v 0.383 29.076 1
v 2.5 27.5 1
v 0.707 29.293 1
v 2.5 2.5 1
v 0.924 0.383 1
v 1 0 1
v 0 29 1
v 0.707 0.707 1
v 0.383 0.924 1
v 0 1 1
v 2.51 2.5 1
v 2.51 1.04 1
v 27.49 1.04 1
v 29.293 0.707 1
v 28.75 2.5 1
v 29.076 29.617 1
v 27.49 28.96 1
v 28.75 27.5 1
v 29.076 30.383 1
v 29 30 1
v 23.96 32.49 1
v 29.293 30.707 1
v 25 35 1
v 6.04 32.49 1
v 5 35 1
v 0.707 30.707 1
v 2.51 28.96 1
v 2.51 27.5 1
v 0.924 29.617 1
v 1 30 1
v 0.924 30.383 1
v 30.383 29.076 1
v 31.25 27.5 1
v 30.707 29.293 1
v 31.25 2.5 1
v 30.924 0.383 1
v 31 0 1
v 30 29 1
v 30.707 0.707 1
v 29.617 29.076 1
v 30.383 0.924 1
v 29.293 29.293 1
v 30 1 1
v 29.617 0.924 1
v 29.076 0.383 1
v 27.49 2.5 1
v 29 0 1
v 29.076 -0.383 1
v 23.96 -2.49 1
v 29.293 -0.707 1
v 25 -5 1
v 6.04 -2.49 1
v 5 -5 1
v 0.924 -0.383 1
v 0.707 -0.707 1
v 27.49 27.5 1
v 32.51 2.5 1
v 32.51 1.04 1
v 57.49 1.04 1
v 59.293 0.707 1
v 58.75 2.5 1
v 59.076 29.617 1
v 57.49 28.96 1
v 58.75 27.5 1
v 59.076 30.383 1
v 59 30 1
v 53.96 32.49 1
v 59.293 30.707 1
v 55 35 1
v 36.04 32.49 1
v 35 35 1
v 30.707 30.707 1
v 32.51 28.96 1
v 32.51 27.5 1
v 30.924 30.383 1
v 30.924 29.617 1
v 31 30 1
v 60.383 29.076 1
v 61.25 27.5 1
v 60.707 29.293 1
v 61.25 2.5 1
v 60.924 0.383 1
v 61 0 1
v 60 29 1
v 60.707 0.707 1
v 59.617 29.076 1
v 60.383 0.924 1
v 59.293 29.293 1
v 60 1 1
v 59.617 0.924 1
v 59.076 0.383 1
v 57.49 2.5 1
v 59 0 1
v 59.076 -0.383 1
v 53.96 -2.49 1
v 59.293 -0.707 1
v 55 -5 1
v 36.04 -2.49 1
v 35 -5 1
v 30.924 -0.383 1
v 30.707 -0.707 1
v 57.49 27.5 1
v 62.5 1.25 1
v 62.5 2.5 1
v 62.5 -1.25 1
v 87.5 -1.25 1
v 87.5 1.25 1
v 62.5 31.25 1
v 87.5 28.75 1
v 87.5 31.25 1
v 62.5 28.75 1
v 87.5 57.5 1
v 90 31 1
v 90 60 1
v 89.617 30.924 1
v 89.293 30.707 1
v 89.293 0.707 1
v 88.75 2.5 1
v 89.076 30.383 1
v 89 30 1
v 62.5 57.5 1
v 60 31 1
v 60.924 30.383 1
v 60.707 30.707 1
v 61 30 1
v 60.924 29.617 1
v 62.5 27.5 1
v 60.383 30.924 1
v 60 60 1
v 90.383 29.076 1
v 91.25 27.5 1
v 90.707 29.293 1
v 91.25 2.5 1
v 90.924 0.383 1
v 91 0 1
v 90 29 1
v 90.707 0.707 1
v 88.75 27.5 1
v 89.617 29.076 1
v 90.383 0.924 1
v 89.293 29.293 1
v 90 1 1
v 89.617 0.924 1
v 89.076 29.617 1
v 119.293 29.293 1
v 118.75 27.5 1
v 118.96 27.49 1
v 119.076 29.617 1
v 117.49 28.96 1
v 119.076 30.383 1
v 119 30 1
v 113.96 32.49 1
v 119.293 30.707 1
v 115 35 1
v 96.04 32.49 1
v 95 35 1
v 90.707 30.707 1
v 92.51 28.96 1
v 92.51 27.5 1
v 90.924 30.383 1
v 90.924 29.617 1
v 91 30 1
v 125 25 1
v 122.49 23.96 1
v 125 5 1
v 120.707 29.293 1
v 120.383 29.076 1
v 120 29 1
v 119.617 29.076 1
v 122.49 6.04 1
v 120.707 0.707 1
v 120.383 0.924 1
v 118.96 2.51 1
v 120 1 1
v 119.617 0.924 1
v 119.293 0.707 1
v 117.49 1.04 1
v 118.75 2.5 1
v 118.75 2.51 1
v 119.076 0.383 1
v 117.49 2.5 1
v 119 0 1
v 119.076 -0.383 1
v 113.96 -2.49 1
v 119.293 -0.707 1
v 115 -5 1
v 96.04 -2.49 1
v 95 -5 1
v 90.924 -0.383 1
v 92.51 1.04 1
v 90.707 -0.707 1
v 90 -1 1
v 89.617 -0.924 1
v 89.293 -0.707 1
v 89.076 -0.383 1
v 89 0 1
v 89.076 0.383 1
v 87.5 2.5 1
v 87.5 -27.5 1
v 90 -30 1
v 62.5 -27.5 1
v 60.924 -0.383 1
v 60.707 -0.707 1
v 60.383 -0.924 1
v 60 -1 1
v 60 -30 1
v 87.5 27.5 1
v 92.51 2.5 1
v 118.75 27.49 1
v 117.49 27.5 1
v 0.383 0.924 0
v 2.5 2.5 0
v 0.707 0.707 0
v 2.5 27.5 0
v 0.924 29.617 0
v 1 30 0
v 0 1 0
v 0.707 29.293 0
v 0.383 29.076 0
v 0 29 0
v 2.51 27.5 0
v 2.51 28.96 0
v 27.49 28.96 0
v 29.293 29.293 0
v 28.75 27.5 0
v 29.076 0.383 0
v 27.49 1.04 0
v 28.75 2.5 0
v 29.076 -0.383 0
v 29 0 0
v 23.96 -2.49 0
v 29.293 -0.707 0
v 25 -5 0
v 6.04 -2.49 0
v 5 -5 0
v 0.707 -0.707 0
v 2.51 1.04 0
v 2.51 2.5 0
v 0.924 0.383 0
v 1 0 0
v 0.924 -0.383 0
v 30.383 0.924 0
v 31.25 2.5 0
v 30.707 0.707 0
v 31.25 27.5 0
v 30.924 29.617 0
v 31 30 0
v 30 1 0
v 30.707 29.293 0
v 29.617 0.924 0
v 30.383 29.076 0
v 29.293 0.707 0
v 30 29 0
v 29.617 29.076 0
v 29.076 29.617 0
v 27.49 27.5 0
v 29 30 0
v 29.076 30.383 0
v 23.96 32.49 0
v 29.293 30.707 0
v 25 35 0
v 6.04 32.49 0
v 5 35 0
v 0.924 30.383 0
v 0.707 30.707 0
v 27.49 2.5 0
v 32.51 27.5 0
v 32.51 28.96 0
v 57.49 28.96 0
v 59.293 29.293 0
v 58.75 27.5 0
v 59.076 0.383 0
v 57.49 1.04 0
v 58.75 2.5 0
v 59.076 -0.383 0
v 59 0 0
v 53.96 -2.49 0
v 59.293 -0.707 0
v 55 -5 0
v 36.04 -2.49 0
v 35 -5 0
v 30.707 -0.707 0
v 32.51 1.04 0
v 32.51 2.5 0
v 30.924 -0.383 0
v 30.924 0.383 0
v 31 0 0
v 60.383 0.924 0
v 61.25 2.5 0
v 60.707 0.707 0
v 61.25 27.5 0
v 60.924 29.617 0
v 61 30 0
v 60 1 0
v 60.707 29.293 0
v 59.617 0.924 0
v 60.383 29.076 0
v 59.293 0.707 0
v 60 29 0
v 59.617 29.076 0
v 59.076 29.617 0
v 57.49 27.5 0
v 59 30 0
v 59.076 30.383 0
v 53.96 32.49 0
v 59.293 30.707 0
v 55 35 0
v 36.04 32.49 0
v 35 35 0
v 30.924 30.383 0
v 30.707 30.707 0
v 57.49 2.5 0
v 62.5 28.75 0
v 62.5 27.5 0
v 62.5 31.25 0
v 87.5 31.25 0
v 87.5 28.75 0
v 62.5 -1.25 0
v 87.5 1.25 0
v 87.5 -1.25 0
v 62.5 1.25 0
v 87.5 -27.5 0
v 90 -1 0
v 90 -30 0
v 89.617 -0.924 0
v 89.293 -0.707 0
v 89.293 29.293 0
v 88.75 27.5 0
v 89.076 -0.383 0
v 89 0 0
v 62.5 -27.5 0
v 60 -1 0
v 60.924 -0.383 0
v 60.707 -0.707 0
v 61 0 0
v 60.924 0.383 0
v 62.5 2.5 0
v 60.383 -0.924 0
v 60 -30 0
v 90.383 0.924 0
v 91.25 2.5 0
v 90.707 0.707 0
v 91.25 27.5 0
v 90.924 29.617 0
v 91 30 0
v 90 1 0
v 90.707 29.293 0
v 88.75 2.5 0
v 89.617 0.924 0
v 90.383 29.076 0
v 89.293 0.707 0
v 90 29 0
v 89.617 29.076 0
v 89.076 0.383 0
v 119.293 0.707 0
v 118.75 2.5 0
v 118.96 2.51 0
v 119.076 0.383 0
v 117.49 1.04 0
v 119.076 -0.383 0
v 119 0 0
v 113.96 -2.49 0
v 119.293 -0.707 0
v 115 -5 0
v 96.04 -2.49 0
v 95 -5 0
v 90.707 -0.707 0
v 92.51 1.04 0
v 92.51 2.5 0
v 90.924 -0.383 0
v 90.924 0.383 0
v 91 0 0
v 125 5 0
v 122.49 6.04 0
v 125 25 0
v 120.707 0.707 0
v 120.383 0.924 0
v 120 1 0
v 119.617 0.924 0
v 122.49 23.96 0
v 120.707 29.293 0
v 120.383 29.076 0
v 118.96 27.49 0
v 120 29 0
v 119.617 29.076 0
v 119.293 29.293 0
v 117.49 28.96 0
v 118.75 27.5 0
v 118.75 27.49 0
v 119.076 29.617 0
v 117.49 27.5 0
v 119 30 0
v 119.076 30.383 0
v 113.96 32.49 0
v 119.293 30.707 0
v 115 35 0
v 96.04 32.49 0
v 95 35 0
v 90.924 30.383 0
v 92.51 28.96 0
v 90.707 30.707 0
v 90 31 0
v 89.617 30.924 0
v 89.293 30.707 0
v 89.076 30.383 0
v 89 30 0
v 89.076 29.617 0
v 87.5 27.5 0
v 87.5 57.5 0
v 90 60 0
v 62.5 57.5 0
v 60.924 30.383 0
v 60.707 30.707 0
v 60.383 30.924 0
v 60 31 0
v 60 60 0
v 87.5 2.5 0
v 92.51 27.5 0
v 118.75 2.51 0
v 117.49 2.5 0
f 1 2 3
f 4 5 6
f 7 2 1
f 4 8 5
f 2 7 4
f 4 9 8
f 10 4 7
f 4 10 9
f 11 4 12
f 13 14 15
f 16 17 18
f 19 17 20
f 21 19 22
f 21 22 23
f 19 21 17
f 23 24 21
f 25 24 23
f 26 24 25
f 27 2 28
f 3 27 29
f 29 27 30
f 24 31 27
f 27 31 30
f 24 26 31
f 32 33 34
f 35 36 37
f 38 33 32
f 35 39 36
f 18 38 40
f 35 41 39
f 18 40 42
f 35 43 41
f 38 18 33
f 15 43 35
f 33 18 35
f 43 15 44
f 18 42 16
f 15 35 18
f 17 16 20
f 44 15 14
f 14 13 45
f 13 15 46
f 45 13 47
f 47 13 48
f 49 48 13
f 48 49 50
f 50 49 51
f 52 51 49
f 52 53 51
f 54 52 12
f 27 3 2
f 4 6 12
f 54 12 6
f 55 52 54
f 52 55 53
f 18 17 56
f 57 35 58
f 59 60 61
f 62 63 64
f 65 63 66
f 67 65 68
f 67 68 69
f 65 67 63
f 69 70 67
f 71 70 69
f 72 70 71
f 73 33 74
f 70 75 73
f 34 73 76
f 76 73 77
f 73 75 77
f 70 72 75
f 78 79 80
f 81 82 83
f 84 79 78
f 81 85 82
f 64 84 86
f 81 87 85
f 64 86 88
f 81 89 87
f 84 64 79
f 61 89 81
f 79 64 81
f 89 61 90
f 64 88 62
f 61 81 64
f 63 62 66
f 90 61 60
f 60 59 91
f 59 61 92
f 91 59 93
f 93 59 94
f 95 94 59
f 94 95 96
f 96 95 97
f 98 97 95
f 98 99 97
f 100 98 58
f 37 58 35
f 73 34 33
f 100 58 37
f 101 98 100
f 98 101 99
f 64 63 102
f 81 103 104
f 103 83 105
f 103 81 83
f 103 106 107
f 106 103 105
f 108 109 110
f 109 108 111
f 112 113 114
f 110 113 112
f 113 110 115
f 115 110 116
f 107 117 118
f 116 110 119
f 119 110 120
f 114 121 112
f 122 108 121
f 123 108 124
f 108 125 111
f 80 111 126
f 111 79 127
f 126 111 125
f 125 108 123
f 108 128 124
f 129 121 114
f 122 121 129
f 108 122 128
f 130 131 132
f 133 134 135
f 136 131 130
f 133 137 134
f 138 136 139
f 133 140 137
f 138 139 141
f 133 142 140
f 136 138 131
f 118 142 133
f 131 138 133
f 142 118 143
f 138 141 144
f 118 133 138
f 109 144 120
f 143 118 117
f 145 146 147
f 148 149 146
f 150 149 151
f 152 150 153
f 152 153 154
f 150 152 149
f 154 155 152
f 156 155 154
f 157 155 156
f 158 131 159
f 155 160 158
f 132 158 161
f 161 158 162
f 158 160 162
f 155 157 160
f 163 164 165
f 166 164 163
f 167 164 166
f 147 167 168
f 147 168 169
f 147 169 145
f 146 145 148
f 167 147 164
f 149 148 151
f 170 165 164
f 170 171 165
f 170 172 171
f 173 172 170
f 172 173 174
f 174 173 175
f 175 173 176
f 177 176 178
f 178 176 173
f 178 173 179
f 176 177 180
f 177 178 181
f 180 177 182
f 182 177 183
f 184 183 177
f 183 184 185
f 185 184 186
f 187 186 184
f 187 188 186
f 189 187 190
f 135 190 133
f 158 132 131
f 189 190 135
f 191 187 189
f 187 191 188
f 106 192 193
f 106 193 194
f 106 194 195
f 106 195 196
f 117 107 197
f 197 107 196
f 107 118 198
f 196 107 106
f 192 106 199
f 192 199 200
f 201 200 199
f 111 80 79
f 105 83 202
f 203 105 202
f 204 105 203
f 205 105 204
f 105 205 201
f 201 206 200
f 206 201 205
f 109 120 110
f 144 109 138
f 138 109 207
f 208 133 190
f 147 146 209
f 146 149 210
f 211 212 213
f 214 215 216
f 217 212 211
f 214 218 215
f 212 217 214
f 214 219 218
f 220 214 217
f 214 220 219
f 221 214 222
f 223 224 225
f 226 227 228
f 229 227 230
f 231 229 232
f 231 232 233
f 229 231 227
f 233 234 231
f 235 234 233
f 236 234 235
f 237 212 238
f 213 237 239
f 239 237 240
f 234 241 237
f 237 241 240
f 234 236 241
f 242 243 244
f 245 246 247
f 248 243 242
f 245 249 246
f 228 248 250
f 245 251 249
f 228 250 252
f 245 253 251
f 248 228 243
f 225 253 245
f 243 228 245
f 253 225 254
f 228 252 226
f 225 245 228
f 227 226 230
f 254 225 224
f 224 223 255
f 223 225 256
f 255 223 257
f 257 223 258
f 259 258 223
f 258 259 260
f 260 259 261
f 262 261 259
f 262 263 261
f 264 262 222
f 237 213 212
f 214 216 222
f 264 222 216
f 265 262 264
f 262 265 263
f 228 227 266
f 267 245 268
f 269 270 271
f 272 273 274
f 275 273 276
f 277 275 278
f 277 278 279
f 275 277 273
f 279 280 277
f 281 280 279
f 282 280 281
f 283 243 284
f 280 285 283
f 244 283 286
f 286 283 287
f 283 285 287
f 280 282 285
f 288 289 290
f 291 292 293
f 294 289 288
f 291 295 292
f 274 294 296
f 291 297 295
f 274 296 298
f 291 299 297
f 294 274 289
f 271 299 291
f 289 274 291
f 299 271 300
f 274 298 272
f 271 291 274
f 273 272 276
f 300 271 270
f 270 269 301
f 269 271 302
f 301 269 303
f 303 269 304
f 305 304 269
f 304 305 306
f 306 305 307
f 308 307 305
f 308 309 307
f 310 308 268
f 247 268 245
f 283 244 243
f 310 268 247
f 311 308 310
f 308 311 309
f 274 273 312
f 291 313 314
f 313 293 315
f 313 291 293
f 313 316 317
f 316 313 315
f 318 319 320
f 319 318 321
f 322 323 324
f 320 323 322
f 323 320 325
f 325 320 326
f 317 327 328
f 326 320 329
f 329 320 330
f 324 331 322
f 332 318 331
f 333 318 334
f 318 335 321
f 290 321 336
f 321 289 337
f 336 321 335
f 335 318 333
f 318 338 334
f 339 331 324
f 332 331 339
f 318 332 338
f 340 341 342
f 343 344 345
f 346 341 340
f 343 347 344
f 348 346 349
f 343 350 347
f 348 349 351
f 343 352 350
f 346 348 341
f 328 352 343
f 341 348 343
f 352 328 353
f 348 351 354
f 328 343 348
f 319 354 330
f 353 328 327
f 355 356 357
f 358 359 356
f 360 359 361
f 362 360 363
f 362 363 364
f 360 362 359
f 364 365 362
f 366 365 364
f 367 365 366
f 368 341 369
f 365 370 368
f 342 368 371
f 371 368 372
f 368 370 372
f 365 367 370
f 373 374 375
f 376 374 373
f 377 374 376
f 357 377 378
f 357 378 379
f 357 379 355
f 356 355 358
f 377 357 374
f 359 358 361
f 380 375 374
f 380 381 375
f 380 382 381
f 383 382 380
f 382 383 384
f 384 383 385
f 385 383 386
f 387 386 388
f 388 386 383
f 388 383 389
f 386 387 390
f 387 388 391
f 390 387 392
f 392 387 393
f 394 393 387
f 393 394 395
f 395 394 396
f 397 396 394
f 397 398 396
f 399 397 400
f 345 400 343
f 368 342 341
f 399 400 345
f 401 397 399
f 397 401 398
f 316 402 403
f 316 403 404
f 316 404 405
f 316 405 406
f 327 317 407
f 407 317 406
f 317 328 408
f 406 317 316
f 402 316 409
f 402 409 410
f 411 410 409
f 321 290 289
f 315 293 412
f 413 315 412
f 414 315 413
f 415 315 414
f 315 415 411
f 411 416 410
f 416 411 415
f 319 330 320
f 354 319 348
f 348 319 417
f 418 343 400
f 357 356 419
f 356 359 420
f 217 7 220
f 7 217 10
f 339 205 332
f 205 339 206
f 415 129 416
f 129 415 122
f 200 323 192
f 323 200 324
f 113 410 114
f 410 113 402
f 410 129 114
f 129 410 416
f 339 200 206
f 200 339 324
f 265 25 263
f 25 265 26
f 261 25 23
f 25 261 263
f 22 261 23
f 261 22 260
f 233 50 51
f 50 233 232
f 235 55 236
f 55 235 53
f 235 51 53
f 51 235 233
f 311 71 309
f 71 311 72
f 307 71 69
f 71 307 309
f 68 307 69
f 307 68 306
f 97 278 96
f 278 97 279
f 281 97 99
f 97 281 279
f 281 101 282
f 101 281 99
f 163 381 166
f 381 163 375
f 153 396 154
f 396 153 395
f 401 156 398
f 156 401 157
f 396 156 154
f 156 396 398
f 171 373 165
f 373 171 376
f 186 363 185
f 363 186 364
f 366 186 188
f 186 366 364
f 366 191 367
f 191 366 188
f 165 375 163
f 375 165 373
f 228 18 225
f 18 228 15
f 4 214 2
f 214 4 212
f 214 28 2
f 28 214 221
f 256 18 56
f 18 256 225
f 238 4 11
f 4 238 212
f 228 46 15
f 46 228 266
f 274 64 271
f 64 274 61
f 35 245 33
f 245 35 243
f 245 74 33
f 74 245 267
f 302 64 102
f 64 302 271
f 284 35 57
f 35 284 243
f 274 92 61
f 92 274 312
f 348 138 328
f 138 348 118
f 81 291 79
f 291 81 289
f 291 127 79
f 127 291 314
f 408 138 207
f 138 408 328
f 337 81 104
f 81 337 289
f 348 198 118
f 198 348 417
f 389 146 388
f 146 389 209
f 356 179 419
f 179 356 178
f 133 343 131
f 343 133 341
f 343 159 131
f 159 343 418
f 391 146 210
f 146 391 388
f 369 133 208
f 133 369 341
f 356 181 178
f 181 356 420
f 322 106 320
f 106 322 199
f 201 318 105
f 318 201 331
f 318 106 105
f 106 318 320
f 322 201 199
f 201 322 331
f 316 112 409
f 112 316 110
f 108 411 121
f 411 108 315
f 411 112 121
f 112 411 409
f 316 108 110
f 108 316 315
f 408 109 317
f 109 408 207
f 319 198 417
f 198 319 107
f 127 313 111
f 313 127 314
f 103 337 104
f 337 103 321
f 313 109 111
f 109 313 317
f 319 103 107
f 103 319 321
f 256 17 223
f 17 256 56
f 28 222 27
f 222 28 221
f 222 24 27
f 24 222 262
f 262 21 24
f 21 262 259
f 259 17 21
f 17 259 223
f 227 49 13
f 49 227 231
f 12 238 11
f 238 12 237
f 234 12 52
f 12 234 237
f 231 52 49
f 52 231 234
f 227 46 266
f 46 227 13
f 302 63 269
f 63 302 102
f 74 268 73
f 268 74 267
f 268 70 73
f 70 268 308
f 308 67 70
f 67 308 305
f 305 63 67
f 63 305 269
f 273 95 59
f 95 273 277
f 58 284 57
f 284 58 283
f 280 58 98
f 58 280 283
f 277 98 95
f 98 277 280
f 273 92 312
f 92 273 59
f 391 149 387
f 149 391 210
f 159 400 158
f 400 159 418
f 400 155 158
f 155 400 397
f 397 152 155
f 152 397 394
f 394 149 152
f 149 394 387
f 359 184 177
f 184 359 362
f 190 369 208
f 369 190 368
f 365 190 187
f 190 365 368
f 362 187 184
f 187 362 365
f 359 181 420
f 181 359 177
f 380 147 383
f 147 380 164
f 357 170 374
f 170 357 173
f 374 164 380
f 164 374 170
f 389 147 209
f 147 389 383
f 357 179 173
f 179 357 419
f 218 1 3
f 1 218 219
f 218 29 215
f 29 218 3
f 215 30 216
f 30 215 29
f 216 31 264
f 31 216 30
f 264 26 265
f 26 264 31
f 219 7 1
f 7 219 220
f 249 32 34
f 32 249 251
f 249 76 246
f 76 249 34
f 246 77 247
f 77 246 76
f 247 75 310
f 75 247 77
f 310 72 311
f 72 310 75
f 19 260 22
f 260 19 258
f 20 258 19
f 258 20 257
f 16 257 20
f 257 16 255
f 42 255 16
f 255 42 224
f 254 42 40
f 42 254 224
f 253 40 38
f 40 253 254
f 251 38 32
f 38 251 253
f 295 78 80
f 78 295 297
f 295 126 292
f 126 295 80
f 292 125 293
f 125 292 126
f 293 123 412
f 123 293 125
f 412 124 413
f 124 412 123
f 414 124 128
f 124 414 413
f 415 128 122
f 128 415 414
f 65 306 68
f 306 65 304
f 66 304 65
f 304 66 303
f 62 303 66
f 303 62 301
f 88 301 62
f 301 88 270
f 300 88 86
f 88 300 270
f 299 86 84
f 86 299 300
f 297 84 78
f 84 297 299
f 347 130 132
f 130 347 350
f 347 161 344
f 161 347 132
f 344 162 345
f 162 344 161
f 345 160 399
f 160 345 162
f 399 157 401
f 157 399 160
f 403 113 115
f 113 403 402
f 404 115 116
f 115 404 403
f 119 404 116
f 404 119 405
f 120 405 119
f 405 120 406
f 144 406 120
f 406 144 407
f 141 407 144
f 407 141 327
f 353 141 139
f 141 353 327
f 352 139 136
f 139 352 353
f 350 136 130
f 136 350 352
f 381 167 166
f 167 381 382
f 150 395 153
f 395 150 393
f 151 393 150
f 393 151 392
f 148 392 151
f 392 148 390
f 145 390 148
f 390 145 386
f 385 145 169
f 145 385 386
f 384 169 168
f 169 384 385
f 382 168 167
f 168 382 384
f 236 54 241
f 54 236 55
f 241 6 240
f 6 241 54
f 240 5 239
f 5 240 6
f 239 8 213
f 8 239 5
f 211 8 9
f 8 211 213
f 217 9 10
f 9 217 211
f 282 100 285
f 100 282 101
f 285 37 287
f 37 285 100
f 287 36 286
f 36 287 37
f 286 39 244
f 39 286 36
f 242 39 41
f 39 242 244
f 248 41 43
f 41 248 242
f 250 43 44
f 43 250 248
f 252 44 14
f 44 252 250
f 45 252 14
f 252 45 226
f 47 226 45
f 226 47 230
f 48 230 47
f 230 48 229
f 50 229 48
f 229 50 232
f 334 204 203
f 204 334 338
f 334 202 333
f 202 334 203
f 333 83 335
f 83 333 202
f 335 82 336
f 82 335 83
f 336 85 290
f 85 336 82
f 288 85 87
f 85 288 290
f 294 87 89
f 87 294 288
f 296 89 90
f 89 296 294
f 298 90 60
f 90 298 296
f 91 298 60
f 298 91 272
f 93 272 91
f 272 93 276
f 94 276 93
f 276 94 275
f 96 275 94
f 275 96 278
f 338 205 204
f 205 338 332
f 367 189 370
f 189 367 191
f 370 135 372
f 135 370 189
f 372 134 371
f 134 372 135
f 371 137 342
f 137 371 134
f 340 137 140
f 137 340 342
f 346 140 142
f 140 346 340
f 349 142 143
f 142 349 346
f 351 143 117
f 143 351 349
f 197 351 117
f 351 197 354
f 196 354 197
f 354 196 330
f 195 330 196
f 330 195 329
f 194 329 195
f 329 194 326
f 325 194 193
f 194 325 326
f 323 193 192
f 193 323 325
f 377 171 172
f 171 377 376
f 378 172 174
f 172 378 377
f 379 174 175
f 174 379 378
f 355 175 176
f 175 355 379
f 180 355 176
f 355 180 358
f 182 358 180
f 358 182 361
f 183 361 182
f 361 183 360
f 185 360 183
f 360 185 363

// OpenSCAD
width  = 30;

height = 30;

depth  = 30;

/* [Template settings] */

thickness     = 1;

// Size of pads, small values will you hard time folding them
pad_size      = 5;

// You better keep it empty to save filament
empty         = 1; //[1:yes, 0:no]

/* [Advanced] */

// Width of the beams, ignored if template is filled
beam_width    = 2.5;

// Radius of the notches to mark folding points, modify if your pen does not fit
notch_radius  = 1;

// Whether to enable support. Disabling support will save filament but your template will not be durable.
support       = 1; //[1:yes, 0:no]

/* [Hidden] */

module UnfoldedBox(width, height, depth, thickness) {
    cube([width, depth, thickness]);

    translate([width, 0])
        cube([height, depth, thickness]);
        
    translate([width+height, 0])
        cube([width, depth, thickness]);

    translate([width*2+height, 0])
        cube([height, depth, thickness]);

    translate([width+height, depth])
        cube([width, height, thickness]);
        
    translate([width+height, -height])
        cube([width, height, thickness]);
}

module UnfoldedBoxPads(width, height, depth, thickness, pad_size, beam_width=0) {
    translation = [0, width, width*2+height];
    widths      = [width, height, height];
    
    bwe=beam_width*sqrt(2)-beam_width;
    bw=beam_width;
    
    for(i = [0:2]) {
        t=translation[i];
        w=widths[i];
        linear_extrude(thickness)
        translate([t, depth])
            polygon([
                [bw             ,-bw         ],
                [bw             ,-bwe        ],
                [pad_size+bwe   , pad_size-bw],
                [w-pad_size-bwe , pad_size-bw],
                [w-bw           ,-bwe        ],
                [w-bw           ,-bw         ],
            ]);
            
        linear_extrude(thickness)
        translate([t, 0])
        mirror([0, 1])
            polygon([
                [bw             ,-bw         ],
                [bw             ,-bwe        ],
                [pad_size+bwe   , pad_size-bw],
                [w-pad_size-bwe , pad_size-bw],
                [w-bw           ,-bwe        ],
                [w-bw           ,-bw         ]
            ]);
    }
    
    linear_extrude(thickness)
    translate([width*2+height*2, 0])
        polygon([
            [-bw         , bw                ],
            [-bwe        , bw                ],
            [ pad_size-bw, pad_size+bwe      ],
            [ pad_size-bw, depth-pad_size-bwe],
            [-bwe        , depth-bw          ],
            [-bw         , depth-bw          ]
        ]);
}

difference() {
    union() {
        UnfoldedBox(width, height, depth, thickness);
        UnfoldedBoxPads(width, height, depth, thickness, pad_size);
    }
    
    if(empty) {
        if(support) {        
            translate([beam_width, beam_width, -0.005])
                cube([width-beam_width*1.5, depth-beam_width*2, thickness+0.01]);
            
            translate([width+beam_width*.5, beam_width, -0.005])
                cube([height-beam_width, depth-beam_width*2, thickness+0.01]);
            
            translate([width+height+beam_width*.5, beam_width, -0.005])
                cube([width-beam_width, depth-beam_width*2, thickness+0.01]);
            
            translate([width*2+height+beam_width*.5, beam_width, -0.005])
                cube([height-beam_width, depth-beam_width*2, thickness+0.01]);
            
            translate([beam_width+width+height, beam_width-height, -0.005])
                cube([width-beam_width*2, height-beam_width*1.5, thickness+0.01]);
            
            translate([beam_width+width+height, beam_width*.5+depth, -0.005])
                cube([width-beam_width*2, height-beam_width*1.5, thickness+0.01]);
                            
            translate([beam_width+width+height, beam_width*.5, -0.005])
                cube([width-beam_width*2, height-beam_width*1, thickness+0.01]);

        }
        else {
            translate([beam_width, beam_width, -0.005])
                cube([width*2+height*2-beam_width*2, depth-beam_width*2, thickness+0.01]);
            
            translate([beam_width+width+height, beam_width-height, -0.005])
                cube([width-beam_width*2, height*2-beam_width*2+depth, thickness+0.01]);
        }
        
        translate([0,0,-0.005])
        UnfoldedBoxPads(width, height, depth, thickness+0.01, pad_size, beam_width+0.01);
    }
    $fn=16;
    translate([0,0, -0.005])
    linear_extrude(thickness+0.01) {
        translate([0,0])
        circle(r = notch_radius);
        translate([width,0])
        circle(r = notch_radius);
        translate([width+height,0])
        circle(r = notch_radius);
        translate([width*2+height,0])
        circle(r = notch_radius);
        translate([width*2+height*2,0])
        circle(r = notch_radius);
        
        translate([0,depth]) {
            translate([0,0])
            circle(r = notch_radius);
            translate([width,0])
            circle(r = notch_radius);
            translate([width+height,0])
            circle(r = notch_radius);
            translate([width*2+height,0])
            circle(r = notch_radius);
            translate([width*2+height*2,0])
            circle(r = notch_radius);
        }
        
        circle(r = 1);
    }
    
}
